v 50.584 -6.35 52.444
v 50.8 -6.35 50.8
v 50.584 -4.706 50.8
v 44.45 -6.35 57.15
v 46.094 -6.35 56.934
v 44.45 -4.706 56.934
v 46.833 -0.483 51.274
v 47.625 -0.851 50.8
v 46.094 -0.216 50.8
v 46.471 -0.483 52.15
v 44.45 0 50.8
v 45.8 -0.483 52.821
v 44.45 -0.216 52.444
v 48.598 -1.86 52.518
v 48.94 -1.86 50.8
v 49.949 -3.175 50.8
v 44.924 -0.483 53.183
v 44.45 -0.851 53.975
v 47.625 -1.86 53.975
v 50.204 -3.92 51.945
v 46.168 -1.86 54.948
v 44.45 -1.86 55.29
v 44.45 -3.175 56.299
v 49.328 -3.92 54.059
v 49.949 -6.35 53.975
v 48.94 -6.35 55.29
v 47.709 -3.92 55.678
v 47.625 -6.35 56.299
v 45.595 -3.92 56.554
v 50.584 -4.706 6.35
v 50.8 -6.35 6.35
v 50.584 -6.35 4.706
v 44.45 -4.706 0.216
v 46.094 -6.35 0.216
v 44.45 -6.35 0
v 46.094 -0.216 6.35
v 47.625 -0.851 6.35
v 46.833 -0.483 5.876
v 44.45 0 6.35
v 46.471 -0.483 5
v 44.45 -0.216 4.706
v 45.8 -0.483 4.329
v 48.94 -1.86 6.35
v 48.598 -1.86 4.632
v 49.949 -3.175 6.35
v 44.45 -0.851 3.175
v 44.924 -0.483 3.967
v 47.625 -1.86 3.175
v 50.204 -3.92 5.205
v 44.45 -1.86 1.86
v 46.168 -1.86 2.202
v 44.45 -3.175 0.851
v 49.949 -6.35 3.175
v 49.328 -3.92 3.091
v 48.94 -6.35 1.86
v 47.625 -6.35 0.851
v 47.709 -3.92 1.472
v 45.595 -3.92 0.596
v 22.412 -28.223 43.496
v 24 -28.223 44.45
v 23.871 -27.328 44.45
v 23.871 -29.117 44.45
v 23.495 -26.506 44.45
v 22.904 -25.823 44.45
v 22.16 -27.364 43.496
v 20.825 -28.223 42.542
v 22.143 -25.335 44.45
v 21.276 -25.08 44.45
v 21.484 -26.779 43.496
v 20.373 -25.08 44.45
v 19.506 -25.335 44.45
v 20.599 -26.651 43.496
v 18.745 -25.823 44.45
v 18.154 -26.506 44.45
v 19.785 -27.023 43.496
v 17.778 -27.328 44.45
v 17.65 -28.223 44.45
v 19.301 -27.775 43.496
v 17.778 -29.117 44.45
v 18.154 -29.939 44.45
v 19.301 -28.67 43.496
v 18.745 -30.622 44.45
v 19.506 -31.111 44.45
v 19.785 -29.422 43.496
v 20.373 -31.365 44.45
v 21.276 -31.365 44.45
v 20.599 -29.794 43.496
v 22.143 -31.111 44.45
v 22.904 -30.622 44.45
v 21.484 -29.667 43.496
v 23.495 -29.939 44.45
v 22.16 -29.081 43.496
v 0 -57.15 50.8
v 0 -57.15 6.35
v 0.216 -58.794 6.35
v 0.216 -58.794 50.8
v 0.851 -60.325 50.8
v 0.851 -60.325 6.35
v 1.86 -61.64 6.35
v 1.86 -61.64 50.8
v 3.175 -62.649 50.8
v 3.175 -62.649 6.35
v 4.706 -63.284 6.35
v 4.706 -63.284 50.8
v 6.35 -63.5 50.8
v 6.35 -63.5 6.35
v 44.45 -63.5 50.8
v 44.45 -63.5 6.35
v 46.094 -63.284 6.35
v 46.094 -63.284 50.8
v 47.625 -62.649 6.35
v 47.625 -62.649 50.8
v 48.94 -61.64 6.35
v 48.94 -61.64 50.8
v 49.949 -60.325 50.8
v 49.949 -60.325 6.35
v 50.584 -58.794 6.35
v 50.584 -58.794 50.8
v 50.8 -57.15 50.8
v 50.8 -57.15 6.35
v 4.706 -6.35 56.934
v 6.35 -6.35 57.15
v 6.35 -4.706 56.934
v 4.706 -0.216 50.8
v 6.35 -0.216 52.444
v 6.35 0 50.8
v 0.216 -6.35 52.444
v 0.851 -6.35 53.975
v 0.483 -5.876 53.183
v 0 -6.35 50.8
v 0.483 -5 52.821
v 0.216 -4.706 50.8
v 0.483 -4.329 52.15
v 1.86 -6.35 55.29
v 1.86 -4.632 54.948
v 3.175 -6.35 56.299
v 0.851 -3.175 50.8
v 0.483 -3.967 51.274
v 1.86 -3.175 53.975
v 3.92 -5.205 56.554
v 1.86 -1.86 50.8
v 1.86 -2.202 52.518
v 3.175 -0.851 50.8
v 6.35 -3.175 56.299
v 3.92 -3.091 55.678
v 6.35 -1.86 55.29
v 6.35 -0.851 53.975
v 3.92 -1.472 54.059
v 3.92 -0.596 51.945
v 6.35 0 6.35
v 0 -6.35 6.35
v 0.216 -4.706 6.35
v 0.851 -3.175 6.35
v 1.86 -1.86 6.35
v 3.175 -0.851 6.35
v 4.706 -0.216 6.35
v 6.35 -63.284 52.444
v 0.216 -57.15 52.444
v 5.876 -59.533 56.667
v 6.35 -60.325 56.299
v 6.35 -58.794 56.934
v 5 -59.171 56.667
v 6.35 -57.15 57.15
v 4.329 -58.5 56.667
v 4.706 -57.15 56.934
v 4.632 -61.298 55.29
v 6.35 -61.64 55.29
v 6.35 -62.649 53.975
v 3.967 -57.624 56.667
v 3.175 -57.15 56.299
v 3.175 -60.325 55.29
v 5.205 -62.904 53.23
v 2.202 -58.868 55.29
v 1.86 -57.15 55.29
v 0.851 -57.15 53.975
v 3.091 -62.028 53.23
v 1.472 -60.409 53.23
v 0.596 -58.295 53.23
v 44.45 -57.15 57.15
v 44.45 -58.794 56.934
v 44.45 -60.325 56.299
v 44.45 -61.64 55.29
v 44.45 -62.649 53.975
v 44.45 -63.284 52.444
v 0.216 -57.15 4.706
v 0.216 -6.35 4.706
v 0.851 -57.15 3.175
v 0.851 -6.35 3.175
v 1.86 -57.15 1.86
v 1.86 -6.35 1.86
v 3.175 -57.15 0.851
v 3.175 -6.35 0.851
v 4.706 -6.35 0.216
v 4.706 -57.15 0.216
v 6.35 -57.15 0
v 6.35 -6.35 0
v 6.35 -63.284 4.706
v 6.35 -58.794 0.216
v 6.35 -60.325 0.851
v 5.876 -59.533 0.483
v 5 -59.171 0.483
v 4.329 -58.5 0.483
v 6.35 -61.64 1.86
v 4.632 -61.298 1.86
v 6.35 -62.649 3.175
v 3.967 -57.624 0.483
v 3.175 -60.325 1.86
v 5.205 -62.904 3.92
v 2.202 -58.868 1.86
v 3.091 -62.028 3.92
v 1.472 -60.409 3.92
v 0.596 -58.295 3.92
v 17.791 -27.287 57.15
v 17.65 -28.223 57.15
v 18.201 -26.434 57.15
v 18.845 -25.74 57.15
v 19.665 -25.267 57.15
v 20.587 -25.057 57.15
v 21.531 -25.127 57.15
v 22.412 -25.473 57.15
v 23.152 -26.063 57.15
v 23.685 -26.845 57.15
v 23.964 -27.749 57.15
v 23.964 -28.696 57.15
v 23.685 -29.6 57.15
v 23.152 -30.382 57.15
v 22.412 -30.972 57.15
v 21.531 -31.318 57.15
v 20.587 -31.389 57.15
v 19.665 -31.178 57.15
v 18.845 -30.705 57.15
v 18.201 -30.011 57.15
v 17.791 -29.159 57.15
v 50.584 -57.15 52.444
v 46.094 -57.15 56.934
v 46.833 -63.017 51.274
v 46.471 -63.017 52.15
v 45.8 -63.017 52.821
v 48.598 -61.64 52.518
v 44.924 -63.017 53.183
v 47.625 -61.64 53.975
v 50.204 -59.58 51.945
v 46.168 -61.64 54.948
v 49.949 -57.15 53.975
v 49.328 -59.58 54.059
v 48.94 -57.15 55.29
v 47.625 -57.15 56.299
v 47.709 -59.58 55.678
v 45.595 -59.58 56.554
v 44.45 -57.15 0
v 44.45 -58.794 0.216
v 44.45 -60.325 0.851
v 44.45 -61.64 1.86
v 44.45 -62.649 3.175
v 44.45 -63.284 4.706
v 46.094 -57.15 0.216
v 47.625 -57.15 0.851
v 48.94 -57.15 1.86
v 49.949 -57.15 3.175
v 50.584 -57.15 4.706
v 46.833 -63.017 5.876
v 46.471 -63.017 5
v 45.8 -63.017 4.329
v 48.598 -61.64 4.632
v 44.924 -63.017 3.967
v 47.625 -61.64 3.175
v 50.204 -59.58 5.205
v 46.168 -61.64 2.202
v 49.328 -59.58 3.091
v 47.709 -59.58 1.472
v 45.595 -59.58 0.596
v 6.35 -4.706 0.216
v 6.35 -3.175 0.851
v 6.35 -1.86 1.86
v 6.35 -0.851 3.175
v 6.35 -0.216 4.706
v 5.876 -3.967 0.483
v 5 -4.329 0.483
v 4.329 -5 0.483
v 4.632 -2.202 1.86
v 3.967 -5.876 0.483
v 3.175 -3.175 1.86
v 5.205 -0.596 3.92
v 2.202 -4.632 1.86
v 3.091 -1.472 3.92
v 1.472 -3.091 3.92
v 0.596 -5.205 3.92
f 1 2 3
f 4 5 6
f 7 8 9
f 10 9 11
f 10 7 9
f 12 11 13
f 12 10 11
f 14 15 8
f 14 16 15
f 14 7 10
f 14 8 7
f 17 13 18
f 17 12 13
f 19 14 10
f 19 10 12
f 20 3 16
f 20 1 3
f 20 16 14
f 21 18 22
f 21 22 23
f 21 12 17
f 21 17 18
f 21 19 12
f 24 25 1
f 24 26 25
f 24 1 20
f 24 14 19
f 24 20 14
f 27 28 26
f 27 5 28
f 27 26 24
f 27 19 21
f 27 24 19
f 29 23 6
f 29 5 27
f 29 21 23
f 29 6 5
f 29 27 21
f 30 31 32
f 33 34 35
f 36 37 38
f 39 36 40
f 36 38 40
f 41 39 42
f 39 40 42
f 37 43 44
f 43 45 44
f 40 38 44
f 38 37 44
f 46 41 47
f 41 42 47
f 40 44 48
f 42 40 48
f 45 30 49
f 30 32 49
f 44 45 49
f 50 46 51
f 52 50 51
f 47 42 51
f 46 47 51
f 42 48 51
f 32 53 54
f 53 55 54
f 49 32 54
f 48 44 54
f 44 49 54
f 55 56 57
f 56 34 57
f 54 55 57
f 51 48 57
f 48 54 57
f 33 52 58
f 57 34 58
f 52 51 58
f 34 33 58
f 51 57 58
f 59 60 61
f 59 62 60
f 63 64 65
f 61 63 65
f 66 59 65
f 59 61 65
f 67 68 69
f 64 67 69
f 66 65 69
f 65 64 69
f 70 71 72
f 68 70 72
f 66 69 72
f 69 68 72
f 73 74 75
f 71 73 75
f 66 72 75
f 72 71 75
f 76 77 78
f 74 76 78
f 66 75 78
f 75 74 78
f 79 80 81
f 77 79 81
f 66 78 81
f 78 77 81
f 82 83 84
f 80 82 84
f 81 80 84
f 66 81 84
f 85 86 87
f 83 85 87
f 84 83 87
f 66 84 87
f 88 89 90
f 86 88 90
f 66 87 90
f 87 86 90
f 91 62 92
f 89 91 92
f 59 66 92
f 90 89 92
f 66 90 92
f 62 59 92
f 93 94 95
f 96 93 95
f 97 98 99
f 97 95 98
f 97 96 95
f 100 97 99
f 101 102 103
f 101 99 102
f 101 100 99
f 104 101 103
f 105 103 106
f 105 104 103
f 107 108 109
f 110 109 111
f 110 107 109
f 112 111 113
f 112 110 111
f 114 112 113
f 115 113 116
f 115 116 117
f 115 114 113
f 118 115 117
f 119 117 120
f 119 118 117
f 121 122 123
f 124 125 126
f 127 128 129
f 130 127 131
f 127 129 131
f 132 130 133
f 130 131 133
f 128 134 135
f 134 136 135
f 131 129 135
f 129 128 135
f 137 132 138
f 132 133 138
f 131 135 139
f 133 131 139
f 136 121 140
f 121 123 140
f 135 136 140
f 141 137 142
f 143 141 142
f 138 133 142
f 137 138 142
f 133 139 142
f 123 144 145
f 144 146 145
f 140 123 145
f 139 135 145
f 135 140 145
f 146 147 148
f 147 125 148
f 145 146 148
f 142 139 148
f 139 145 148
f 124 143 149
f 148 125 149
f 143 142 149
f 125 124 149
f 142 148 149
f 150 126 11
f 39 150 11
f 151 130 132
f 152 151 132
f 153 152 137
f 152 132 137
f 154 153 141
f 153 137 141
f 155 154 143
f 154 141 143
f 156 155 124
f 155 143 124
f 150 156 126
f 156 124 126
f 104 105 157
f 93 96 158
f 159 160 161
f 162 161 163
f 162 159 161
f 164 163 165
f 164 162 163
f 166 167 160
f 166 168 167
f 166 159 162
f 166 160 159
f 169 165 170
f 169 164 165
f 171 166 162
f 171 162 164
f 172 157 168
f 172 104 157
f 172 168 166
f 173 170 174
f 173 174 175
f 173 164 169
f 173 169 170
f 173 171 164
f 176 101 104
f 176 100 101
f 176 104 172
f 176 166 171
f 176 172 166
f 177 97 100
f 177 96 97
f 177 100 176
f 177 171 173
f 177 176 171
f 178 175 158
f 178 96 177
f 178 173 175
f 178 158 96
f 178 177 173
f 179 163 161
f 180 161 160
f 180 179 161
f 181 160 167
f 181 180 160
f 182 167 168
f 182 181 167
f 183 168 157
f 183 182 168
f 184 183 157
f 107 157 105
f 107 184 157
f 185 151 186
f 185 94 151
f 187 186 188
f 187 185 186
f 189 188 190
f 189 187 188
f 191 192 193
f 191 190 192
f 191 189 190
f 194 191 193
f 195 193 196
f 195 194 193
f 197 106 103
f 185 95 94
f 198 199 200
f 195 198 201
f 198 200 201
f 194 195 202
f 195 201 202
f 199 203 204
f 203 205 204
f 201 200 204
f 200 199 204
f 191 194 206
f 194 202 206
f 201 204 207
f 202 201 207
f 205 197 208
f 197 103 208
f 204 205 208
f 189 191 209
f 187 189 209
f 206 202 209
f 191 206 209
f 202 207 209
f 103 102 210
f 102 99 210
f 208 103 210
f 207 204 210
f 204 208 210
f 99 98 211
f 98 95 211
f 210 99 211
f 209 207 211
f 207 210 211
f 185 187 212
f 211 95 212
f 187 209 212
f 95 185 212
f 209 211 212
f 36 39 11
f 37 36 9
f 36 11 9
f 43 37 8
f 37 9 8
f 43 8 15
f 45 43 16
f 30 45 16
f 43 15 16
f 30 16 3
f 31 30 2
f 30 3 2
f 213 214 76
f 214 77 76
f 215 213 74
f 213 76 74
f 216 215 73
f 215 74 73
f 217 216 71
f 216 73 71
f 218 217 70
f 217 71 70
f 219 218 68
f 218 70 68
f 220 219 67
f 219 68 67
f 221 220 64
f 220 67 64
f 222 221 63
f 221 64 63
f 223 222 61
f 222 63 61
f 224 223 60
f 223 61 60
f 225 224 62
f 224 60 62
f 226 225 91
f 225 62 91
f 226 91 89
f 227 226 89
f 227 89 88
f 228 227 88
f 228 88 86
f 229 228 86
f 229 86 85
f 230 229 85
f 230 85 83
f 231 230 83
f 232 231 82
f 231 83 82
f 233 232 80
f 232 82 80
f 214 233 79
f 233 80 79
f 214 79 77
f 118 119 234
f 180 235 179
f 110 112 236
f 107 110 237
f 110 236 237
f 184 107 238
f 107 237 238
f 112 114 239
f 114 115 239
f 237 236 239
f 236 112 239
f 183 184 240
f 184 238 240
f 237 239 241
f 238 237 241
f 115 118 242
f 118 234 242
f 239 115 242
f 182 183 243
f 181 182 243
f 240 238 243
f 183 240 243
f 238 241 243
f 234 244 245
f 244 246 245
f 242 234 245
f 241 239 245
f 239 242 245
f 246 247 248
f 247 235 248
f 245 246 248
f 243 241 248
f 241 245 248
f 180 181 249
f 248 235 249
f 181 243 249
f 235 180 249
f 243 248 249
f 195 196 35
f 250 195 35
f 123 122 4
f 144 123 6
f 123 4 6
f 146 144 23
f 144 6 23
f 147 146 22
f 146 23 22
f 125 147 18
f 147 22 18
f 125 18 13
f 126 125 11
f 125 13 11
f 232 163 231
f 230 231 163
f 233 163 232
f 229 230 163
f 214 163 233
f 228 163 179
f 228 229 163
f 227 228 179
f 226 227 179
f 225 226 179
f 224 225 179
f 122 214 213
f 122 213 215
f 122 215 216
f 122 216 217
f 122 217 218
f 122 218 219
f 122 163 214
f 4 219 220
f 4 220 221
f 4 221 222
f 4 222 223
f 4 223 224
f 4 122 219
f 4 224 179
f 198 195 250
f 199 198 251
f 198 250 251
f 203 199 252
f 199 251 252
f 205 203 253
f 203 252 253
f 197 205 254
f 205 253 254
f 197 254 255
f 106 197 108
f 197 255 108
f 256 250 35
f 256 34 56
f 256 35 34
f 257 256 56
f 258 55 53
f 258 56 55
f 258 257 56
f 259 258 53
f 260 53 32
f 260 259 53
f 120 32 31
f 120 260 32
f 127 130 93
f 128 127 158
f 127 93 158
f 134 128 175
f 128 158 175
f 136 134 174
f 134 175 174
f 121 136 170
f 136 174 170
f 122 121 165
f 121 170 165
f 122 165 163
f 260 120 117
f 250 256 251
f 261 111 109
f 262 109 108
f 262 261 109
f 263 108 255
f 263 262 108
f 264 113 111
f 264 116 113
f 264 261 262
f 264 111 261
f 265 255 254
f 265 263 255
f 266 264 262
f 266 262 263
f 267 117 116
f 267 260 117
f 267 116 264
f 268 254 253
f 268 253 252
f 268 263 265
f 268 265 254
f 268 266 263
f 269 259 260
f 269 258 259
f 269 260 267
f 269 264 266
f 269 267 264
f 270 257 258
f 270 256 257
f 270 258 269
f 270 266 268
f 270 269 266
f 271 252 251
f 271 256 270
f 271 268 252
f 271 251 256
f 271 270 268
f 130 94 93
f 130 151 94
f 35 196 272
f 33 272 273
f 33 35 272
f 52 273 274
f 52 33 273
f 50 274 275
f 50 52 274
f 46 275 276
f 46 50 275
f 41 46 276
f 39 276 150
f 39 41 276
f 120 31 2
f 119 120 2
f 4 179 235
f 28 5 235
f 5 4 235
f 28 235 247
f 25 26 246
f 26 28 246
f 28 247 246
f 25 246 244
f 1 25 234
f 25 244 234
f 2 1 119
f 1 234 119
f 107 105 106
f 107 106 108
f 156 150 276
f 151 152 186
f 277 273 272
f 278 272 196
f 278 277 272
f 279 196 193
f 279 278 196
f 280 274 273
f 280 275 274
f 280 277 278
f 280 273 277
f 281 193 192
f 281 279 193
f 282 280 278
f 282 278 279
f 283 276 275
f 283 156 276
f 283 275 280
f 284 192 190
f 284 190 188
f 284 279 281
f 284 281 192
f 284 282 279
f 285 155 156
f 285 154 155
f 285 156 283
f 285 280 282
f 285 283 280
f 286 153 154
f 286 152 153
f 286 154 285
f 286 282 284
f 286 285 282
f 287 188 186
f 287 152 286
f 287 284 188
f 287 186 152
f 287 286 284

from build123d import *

# Parameters (mm, degrees)
F0_W     = 50.8
F0_H     = 57.15
F1_DEPTH = 63.5
F3_D     = 6.35
F3_DEPTH = 12.7
F3_TIP   = 1.9077324654
F4_R     = 6.35


with BuildPart() as f1:
    # F0 (on Front) → F1 (new body)
    with BuildSketch(Plane.XZ):
        with Locations((25.4, 28.575)):
            Rectangle(F0_W, F0_H)
    extrude(amount=F1_DEPTH)

    # F3
    with Locations(Plane.XY.offset(57.15)):
        with Locations((20.8245180547, -28.2227080315)):
            Hole(F3_D / 2, depth=F3_DEPTH)
            with Locations((0, 0, -(F3_DEPTH + F3_TIP / 2))):  # 118° drill point
                Cone(0, F3_D / 2, F3_TIP, mode=Mode.SUBTRACT)

    # F4
    f4_edges = [f1.edges().sort_by_distance(p)[0] for p in [
        (50.8, -31.75, 0),
        (50.8, -31.75, 57.15),
        (50.8, 0, 28.575),
        (50.8, -63.5, 28.575),
        (0, -63.5, 28.575),
        (25.4, -63.5, 0),
        (25.4, -63.5, 57.15),
        (25.4, 0, 57.15),
        (0, -31.75, 57.15),
        (0, 0, 28.575),
        (25.4, 0, 0),
        (0, -31.75, 0),
    ]]
    fillet(f4_edges, radius=F4_R)


solid = f1.part
